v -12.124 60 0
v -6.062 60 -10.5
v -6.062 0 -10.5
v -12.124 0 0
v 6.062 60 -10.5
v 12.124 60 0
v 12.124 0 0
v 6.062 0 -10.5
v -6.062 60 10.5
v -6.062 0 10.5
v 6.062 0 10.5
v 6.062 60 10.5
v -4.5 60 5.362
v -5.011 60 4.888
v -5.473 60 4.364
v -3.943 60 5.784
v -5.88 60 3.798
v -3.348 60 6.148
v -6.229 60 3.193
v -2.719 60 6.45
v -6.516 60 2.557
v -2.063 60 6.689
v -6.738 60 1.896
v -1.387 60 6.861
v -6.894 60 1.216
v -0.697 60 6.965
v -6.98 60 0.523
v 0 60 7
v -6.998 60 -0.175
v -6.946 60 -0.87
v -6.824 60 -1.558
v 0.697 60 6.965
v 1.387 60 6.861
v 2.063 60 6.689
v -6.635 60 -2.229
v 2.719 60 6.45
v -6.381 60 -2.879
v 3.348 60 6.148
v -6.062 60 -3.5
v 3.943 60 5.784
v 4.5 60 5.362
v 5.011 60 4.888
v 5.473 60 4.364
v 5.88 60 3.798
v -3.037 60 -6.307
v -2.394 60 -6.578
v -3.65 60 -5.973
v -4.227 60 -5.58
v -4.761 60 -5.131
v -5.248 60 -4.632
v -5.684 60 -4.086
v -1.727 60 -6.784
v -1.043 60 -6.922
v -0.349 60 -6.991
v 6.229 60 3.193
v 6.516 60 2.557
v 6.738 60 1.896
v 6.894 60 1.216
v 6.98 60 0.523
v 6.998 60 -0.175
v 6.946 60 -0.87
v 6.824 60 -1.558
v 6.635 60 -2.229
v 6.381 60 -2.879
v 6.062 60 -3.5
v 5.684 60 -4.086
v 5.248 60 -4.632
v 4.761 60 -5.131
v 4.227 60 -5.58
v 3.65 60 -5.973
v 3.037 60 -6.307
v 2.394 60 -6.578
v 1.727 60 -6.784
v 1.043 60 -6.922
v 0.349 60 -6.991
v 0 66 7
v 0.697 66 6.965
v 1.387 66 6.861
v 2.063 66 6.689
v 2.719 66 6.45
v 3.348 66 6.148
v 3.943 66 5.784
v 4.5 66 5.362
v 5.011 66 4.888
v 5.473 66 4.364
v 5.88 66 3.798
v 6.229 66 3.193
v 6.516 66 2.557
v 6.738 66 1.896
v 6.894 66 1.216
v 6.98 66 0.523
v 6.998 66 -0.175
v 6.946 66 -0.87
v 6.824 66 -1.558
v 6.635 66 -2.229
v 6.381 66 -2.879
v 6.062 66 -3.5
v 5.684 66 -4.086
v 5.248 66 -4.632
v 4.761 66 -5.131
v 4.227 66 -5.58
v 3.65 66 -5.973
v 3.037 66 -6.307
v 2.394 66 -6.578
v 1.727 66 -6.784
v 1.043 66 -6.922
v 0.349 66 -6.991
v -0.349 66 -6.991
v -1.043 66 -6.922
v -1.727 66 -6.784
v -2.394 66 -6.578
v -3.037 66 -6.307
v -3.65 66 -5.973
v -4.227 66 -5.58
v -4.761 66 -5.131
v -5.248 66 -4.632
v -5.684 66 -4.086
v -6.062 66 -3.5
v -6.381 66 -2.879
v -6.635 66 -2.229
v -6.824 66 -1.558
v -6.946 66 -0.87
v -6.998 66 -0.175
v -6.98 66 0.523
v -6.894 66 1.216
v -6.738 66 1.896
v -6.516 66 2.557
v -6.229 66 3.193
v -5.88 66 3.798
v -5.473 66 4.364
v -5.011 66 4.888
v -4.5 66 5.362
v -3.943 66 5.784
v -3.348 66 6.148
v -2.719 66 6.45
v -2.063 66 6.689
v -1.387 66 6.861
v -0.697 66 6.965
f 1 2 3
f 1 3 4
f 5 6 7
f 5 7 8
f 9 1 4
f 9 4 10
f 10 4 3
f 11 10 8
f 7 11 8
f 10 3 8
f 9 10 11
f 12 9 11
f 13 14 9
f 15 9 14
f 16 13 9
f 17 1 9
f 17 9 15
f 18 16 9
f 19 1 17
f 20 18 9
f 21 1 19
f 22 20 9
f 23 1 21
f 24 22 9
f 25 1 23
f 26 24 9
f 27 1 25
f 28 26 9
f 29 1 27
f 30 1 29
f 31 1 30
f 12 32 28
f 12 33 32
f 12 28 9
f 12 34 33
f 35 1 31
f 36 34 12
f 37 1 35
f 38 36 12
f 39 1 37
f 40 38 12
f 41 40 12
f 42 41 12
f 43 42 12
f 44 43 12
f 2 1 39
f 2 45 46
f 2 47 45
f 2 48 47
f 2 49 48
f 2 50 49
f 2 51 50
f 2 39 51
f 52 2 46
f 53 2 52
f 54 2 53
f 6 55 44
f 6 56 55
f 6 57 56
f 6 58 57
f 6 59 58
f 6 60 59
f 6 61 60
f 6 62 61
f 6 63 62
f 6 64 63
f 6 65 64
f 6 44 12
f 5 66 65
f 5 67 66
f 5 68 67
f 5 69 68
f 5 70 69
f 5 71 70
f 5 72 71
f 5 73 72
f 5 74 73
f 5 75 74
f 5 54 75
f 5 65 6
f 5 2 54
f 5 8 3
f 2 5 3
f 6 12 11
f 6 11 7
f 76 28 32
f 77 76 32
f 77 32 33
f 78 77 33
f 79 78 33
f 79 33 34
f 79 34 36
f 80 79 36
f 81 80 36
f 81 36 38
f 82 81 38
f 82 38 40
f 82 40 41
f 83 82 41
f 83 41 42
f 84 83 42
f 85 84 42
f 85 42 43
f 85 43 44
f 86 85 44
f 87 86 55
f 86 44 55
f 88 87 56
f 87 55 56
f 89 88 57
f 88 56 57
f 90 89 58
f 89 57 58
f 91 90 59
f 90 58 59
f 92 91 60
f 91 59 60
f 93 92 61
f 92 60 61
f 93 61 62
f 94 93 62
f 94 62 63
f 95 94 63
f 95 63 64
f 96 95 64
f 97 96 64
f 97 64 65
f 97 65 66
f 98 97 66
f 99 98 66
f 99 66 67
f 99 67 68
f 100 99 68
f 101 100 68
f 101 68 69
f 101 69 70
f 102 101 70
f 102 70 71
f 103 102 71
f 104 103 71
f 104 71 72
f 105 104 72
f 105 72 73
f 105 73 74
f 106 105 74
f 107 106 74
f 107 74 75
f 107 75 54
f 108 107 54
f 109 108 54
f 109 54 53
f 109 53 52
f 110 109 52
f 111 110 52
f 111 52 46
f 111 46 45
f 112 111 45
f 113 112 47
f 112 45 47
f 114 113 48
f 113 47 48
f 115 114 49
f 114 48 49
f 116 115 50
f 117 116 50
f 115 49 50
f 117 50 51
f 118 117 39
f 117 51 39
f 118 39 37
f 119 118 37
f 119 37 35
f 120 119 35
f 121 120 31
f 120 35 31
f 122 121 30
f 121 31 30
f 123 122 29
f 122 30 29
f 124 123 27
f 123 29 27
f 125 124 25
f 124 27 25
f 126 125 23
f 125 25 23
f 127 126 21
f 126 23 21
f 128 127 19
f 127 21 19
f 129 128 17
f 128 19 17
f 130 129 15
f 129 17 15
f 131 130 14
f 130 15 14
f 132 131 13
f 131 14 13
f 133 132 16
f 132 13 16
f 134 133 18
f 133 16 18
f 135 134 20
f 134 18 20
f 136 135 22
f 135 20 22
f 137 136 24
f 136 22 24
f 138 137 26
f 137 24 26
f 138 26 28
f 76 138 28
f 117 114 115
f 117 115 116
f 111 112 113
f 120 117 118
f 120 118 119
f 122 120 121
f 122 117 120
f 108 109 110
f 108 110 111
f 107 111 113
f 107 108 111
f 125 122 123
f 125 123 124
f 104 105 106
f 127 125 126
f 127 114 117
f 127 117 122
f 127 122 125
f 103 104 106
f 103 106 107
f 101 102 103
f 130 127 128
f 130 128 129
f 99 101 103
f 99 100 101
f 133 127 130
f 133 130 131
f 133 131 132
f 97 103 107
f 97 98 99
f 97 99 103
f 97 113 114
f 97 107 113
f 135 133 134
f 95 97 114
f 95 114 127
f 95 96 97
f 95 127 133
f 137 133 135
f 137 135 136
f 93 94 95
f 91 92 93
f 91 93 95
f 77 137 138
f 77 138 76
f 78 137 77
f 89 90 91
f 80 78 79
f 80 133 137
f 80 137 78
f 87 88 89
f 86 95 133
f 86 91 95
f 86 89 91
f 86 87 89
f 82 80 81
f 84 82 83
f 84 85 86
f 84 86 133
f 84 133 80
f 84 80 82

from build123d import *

# Parameters (mm, degrees)
SKETCH1_R           = 7
BOSS_EXTRUDE1_DEPTH = 60
SKETCH1_3_R         = 7
BOSS_EXTRUDE2_DEPTH = 66


with BuildPart() as part:
    # Sketch1 → Boss-Extrude1 (new body)
    with BuildSketch(Plane(origin=(0, 0, 0), x_dir=(1, 0, 0), z_dir=(0, 1, 0))):
        Polygon((12.124355653, 0), (6.062177826, 10.5), (-6.062177826, 10.5), (-12.124355653, 0), (-6.062177826, -10.5), (6.062177826, -10.5), align=None)
        Circle(SKETCH1_R, mode=Mode.SUBTRACT)
    extrude(amount=BOSS_EXTRUDE1_DEPTH)

    # Sketch1<3> → Boss-Extrude2 (add)
    with BuildSketch(Plane(origin=(0, 0, 0), x_dir=(1, 0, 0), z_dir=(0, 1, 0))):
        Circle(SKETCH1_3_R)
    extrude(amount=BOSS_EXTRUDE2_DEPTH)


solid = part.part
